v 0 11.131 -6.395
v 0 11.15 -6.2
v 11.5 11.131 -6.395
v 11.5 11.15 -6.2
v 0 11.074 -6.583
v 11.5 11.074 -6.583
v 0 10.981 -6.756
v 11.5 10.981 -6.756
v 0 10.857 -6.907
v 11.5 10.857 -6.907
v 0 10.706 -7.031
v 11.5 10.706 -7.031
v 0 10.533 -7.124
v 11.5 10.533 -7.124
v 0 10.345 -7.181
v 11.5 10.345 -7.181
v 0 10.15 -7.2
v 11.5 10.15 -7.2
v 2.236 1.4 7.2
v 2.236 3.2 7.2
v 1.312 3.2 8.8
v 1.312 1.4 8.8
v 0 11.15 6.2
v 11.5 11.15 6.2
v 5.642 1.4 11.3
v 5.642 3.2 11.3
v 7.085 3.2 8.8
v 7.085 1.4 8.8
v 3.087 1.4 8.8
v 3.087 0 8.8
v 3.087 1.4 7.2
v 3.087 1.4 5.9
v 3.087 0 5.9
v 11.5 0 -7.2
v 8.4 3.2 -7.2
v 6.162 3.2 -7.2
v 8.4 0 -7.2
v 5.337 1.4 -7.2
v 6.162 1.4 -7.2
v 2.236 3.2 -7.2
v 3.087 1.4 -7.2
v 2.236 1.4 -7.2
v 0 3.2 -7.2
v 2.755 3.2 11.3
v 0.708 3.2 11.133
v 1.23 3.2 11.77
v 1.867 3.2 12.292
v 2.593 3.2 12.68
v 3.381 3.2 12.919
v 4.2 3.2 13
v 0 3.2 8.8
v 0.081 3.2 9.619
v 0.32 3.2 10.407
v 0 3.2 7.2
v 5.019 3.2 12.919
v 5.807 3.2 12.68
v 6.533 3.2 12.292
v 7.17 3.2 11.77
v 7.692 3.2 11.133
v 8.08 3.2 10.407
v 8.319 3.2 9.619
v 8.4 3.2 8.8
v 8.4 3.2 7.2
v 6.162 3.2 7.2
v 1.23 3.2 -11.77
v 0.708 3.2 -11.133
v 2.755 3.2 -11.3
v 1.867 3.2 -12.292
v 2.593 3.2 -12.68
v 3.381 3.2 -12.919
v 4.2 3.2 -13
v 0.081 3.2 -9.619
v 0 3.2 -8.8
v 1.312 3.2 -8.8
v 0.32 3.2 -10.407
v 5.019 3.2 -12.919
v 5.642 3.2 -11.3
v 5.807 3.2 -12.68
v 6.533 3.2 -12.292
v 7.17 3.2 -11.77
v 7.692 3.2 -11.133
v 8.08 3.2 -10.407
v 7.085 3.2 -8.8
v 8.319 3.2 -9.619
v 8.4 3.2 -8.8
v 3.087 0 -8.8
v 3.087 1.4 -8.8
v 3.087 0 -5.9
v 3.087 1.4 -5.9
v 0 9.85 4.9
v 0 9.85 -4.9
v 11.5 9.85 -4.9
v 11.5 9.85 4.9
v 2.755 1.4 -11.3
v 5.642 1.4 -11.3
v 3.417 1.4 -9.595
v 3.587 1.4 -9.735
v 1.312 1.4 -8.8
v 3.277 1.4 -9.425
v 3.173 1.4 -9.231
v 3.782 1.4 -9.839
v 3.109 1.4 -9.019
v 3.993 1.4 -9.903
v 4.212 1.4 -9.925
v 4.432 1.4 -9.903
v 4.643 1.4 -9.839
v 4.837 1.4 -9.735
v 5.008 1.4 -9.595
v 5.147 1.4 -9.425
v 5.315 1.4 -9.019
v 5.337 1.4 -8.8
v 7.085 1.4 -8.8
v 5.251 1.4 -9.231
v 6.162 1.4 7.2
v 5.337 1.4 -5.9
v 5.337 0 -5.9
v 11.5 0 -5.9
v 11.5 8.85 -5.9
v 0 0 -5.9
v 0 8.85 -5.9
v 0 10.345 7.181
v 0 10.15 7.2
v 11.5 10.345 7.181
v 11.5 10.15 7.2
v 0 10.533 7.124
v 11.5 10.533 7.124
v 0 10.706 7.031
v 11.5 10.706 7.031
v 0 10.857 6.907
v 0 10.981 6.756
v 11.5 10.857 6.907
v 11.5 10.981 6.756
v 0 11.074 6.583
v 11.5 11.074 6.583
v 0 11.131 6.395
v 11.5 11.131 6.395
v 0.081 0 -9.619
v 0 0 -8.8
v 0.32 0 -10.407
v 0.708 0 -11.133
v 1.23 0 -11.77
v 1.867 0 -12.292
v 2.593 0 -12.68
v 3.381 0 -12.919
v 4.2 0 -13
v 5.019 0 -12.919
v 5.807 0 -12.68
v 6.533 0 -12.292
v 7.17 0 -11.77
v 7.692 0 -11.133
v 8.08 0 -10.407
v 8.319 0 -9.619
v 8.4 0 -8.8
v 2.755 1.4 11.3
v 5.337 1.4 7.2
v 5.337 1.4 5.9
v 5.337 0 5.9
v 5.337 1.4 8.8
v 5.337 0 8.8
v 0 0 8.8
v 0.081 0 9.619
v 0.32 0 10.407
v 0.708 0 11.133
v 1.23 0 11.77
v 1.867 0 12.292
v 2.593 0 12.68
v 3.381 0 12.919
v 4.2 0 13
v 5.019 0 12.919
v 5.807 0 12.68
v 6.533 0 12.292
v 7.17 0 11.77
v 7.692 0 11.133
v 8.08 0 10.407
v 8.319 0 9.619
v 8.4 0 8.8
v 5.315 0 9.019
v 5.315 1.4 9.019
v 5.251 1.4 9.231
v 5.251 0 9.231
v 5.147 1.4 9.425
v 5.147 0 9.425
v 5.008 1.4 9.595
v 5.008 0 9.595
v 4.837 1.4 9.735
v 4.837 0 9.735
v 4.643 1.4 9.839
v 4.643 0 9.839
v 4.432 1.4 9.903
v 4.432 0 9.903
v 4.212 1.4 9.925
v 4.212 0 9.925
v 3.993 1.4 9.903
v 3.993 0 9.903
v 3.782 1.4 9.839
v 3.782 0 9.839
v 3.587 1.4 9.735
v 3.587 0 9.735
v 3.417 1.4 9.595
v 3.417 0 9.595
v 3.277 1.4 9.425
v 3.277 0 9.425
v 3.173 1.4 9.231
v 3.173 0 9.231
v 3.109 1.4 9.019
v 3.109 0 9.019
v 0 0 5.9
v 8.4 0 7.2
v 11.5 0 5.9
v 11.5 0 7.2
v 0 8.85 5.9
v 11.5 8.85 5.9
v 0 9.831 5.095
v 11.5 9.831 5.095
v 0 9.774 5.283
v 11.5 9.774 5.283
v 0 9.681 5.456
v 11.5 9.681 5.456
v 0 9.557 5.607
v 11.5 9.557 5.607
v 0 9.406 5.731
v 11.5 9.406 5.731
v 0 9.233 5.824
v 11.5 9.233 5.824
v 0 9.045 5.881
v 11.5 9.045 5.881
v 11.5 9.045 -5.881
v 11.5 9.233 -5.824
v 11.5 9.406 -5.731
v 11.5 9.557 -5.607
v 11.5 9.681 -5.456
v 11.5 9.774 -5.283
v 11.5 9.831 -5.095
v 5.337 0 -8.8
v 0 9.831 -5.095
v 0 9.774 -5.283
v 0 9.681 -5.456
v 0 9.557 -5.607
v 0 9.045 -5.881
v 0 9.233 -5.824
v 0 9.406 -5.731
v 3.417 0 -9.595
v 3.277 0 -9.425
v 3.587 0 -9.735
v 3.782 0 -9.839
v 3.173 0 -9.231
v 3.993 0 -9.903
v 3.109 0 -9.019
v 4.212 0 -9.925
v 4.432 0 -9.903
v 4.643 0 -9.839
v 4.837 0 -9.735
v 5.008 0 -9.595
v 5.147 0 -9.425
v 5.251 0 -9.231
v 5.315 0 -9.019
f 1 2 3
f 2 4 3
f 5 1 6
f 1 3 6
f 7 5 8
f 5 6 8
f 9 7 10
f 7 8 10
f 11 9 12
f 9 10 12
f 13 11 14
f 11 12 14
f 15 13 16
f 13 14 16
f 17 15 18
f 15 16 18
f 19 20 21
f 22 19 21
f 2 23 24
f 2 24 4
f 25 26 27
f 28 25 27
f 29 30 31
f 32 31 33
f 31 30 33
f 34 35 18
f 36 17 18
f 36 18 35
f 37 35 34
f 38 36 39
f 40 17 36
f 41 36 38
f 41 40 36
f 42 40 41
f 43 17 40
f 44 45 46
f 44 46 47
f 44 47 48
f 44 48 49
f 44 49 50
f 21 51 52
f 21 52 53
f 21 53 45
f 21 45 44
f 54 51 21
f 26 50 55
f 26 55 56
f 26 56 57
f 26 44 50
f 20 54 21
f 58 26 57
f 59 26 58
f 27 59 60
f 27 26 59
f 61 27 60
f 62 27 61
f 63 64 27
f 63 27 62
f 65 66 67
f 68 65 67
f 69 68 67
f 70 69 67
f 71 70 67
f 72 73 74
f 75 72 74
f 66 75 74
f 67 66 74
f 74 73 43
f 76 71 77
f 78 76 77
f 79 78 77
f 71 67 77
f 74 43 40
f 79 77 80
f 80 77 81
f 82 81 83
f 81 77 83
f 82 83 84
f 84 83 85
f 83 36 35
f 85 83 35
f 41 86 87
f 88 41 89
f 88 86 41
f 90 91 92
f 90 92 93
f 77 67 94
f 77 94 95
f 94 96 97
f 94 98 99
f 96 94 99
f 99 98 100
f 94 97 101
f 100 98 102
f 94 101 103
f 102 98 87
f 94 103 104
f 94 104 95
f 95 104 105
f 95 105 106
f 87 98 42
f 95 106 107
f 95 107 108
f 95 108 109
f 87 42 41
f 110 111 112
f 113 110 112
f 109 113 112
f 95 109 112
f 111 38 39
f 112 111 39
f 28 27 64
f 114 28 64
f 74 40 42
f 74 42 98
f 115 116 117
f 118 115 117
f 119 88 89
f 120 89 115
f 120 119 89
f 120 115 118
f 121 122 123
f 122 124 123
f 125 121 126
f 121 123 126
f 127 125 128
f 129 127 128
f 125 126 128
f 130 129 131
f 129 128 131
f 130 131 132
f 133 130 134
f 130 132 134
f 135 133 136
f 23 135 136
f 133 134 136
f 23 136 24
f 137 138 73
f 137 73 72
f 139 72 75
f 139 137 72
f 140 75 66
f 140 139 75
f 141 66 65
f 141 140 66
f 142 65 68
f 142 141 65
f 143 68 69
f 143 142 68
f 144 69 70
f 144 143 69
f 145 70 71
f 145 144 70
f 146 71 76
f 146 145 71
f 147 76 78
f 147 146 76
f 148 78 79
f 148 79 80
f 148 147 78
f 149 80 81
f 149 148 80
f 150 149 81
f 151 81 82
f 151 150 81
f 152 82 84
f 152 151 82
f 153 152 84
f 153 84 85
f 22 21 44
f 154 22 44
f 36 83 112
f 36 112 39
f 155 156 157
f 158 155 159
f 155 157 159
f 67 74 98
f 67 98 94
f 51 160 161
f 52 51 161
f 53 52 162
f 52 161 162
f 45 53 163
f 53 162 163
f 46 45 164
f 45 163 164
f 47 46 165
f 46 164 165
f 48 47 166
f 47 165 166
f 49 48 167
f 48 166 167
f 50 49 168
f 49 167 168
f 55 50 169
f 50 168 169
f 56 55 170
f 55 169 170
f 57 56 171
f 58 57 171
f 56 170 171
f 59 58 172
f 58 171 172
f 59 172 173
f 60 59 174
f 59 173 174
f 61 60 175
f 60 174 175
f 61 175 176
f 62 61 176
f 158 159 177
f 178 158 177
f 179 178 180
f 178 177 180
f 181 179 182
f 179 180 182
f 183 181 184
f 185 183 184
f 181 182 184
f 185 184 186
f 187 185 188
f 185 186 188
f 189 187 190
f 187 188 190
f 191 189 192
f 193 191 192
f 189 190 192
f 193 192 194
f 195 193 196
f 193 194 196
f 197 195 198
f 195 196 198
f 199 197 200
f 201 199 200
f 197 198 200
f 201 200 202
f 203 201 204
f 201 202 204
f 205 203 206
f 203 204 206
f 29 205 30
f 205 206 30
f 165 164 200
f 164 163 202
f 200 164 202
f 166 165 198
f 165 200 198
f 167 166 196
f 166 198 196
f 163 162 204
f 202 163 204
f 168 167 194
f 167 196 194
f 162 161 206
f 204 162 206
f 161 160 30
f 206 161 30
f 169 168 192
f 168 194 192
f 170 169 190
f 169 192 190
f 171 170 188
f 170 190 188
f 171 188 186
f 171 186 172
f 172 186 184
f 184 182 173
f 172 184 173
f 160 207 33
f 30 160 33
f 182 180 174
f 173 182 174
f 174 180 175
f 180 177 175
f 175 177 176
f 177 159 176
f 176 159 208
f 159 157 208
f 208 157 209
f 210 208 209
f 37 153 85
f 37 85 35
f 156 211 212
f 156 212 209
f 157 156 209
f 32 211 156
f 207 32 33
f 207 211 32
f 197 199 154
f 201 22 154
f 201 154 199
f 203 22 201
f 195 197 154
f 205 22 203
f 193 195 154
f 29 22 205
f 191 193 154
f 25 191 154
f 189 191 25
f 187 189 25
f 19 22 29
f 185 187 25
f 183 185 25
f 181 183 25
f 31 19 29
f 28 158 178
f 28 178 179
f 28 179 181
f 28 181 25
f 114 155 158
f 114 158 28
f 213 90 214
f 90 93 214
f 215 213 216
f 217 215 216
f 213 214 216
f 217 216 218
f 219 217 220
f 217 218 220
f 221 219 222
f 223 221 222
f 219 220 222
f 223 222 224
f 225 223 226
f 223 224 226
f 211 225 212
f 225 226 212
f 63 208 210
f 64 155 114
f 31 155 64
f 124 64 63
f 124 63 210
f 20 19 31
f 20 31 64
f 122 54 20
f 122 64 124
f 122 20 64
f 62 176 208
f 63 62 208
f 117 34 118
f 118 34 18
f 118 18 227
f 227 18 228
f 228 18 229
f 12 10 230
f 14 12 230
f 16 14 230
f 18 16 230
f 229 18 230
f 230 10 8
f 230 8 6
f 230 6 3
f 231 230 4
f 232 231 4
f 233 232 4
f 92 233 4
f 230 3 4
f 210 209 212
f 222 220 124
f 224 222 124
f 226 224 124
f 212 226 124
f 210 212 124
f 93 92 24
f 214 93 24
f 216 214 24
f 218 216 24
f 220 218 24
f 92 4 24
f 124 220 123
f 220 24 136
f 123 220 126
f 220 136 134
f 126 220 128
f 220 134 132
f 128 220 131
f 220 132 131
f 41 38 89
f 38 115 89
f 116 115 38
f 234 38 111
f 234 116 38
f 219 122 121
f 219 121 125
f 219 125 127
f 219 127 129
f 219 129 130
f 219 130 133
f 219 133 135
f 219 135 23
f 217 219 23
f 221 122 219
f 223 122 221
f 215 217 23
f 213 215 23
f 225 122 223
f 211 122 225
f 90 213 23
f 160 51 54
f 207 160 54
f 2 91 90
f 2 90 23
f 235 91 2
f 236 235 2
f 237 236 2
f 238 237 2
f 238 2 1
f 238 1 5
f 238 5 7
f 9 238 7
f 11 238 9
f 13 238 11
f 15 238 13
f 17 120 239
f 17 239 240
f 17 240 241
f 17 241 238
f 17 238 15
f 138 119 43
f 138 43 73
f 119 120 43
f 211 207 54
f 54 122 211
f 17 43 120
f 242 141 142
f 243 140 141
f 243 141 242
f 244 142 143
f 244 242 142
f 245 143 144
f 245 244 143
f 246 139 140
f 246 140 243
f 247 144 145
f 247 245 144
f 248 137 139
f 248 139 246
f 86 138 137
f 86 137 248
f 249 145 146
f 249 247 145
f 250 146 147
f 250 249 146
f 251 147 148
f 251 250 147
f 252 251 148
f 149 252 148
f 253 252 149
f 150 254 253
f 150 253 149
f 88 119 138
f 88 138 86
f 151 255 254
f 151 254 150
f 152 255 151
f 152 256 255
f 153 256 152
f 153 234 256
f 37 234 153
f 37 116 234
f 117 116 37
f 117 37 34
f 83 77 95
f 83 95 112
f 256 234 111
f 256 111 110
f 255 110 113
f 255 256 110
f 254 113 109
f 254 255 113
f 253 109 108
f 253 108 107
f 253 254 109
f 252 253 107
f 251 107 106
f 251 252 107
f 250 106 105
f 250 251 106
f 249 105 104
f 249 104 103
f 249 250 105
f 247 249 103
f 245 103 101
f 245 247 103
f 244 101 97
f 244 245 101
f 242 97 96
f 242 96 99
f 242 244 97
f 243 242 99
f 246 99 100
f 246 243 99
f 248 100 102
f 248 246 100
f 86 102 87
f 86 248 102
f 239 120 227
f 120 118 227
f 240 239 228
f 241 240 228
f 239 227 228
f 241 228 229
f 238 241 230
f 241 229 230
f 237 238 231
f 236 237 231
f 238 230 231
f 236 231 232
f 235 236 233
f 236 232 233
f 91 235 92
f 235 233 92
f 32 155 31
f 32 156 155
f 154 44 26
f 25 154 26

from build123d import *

# Parameters (mm, degrees)
EXTRUDE_1_DEPTH     = 11.5
FILLET_1_R          = 1
EXTRUDE_2_DEPTH     = 3.2
CUT_EXTRUDE_1_DEPTH = 1.8
CUT_EXTRUDE_2_DEPTH = 1.4


with BuildPart() as part:
    # 草图1 → 凸台-拉伸1 (new body)
    with BuildSketch(Plane(origin=(0, 0, 0), x_dir=(0, 0, -1), z_dir=(1, 0, 0))):
        Polygon((5.9, 0), (5.9, 9.85), (-5.9, 9.85), (-5.9, 0), (-7.2, 0), (-7.2, 11.15), (7.2, 11.15), (7.2, 0), align=None)
    extrude(amount=EXTRUDE_1_DEPTH)

    # 圆角1
    fillet_1_edges = [part.edges().sort_by_distance(p)[0] for p in [
        (5.75, 11.15, 7.2),
        (5.75, 11.15, -7.2),
        (5.75, 9.85, -5.9),
        (5.75, 9.85, 5.9),
    ]]
    fillet(fillet_1_edges, radius=FILLET_1_R)

    # 草图2 → 凸台-拉伸2 (add)
    with BuildSketch(Plane(origin=(0, 0, 0), x_dir=(1, 0, 0), z_dir=(0, 1, 0))):
        with BuildLine():
            Line((0, -7.2), (0, -8.8))
            ThreePointArc((0, -8.8), (4.2, -13), (8.4, -8.8))
            Line((8.4, -8.8), (8.4, -7.2))
            Line((8.4, -7.2), (0, -7.2))
        make_face()
    extrude_2 = extrude(amount=EXTRUDE_2_DEPTH)

    # 草图10 → 切除-拉伸1 (cut)
    with BuildSketch(Plane(origin=(0, 3.2, 0), x_dir=(1, 0, 0), z_dir=(0, 1, 0))):
        Polygon((7.085479679, -8.8), (6.161719249, -7.2), (2.235737418, -7.2), (1.311976987, -8.8), (2.75535266, -11.3), (5.642104006, -11.3), align=None)
    cut_extrude_1 = extrude(amount=-CUT_EXTRUDE_1_DEPTH, mode=Mode.SUBTRACT)

    # 草图11 → 切除-拉伸2 (cut)
    with BuildSketch(Plane(origin=(0, 0, 0), x_dir=(1, 0, 0), z_dir=(0, 1, 0))):
        with BuildLine():
            Line((3.087032009, -8.8), (3.087032009, -4.948738573))
            Line((3.087032009, -4.948738573), (5.337032009, -4.948738573))
            Line((5.337032009, -4.948738573), (5.337032009, -8.8))
            ThreePointArc((5.337032009, -8.8), (4.212032009, -9.925), (3.087032009, -8.8))
        make_face()
    cut_extrude_2 = extrude(amount=CUT_EXTRUDE_2_DEPTH, mode=Mode.SUBTRACT)

    # 镜向1: 凸台-拉伸2, 切除-拉伸1, 切除-拉伸2 across plane
    add(extrude_2.mirror(Plane.XY))
    add(cut_extrude_1.mirror(Plane.XY), mode=Mode.SUBTRACT)
    add(cut_extrude_2.mirror(Plane.XY), mode=Mode.SUBTRACT)


solid = part.part
